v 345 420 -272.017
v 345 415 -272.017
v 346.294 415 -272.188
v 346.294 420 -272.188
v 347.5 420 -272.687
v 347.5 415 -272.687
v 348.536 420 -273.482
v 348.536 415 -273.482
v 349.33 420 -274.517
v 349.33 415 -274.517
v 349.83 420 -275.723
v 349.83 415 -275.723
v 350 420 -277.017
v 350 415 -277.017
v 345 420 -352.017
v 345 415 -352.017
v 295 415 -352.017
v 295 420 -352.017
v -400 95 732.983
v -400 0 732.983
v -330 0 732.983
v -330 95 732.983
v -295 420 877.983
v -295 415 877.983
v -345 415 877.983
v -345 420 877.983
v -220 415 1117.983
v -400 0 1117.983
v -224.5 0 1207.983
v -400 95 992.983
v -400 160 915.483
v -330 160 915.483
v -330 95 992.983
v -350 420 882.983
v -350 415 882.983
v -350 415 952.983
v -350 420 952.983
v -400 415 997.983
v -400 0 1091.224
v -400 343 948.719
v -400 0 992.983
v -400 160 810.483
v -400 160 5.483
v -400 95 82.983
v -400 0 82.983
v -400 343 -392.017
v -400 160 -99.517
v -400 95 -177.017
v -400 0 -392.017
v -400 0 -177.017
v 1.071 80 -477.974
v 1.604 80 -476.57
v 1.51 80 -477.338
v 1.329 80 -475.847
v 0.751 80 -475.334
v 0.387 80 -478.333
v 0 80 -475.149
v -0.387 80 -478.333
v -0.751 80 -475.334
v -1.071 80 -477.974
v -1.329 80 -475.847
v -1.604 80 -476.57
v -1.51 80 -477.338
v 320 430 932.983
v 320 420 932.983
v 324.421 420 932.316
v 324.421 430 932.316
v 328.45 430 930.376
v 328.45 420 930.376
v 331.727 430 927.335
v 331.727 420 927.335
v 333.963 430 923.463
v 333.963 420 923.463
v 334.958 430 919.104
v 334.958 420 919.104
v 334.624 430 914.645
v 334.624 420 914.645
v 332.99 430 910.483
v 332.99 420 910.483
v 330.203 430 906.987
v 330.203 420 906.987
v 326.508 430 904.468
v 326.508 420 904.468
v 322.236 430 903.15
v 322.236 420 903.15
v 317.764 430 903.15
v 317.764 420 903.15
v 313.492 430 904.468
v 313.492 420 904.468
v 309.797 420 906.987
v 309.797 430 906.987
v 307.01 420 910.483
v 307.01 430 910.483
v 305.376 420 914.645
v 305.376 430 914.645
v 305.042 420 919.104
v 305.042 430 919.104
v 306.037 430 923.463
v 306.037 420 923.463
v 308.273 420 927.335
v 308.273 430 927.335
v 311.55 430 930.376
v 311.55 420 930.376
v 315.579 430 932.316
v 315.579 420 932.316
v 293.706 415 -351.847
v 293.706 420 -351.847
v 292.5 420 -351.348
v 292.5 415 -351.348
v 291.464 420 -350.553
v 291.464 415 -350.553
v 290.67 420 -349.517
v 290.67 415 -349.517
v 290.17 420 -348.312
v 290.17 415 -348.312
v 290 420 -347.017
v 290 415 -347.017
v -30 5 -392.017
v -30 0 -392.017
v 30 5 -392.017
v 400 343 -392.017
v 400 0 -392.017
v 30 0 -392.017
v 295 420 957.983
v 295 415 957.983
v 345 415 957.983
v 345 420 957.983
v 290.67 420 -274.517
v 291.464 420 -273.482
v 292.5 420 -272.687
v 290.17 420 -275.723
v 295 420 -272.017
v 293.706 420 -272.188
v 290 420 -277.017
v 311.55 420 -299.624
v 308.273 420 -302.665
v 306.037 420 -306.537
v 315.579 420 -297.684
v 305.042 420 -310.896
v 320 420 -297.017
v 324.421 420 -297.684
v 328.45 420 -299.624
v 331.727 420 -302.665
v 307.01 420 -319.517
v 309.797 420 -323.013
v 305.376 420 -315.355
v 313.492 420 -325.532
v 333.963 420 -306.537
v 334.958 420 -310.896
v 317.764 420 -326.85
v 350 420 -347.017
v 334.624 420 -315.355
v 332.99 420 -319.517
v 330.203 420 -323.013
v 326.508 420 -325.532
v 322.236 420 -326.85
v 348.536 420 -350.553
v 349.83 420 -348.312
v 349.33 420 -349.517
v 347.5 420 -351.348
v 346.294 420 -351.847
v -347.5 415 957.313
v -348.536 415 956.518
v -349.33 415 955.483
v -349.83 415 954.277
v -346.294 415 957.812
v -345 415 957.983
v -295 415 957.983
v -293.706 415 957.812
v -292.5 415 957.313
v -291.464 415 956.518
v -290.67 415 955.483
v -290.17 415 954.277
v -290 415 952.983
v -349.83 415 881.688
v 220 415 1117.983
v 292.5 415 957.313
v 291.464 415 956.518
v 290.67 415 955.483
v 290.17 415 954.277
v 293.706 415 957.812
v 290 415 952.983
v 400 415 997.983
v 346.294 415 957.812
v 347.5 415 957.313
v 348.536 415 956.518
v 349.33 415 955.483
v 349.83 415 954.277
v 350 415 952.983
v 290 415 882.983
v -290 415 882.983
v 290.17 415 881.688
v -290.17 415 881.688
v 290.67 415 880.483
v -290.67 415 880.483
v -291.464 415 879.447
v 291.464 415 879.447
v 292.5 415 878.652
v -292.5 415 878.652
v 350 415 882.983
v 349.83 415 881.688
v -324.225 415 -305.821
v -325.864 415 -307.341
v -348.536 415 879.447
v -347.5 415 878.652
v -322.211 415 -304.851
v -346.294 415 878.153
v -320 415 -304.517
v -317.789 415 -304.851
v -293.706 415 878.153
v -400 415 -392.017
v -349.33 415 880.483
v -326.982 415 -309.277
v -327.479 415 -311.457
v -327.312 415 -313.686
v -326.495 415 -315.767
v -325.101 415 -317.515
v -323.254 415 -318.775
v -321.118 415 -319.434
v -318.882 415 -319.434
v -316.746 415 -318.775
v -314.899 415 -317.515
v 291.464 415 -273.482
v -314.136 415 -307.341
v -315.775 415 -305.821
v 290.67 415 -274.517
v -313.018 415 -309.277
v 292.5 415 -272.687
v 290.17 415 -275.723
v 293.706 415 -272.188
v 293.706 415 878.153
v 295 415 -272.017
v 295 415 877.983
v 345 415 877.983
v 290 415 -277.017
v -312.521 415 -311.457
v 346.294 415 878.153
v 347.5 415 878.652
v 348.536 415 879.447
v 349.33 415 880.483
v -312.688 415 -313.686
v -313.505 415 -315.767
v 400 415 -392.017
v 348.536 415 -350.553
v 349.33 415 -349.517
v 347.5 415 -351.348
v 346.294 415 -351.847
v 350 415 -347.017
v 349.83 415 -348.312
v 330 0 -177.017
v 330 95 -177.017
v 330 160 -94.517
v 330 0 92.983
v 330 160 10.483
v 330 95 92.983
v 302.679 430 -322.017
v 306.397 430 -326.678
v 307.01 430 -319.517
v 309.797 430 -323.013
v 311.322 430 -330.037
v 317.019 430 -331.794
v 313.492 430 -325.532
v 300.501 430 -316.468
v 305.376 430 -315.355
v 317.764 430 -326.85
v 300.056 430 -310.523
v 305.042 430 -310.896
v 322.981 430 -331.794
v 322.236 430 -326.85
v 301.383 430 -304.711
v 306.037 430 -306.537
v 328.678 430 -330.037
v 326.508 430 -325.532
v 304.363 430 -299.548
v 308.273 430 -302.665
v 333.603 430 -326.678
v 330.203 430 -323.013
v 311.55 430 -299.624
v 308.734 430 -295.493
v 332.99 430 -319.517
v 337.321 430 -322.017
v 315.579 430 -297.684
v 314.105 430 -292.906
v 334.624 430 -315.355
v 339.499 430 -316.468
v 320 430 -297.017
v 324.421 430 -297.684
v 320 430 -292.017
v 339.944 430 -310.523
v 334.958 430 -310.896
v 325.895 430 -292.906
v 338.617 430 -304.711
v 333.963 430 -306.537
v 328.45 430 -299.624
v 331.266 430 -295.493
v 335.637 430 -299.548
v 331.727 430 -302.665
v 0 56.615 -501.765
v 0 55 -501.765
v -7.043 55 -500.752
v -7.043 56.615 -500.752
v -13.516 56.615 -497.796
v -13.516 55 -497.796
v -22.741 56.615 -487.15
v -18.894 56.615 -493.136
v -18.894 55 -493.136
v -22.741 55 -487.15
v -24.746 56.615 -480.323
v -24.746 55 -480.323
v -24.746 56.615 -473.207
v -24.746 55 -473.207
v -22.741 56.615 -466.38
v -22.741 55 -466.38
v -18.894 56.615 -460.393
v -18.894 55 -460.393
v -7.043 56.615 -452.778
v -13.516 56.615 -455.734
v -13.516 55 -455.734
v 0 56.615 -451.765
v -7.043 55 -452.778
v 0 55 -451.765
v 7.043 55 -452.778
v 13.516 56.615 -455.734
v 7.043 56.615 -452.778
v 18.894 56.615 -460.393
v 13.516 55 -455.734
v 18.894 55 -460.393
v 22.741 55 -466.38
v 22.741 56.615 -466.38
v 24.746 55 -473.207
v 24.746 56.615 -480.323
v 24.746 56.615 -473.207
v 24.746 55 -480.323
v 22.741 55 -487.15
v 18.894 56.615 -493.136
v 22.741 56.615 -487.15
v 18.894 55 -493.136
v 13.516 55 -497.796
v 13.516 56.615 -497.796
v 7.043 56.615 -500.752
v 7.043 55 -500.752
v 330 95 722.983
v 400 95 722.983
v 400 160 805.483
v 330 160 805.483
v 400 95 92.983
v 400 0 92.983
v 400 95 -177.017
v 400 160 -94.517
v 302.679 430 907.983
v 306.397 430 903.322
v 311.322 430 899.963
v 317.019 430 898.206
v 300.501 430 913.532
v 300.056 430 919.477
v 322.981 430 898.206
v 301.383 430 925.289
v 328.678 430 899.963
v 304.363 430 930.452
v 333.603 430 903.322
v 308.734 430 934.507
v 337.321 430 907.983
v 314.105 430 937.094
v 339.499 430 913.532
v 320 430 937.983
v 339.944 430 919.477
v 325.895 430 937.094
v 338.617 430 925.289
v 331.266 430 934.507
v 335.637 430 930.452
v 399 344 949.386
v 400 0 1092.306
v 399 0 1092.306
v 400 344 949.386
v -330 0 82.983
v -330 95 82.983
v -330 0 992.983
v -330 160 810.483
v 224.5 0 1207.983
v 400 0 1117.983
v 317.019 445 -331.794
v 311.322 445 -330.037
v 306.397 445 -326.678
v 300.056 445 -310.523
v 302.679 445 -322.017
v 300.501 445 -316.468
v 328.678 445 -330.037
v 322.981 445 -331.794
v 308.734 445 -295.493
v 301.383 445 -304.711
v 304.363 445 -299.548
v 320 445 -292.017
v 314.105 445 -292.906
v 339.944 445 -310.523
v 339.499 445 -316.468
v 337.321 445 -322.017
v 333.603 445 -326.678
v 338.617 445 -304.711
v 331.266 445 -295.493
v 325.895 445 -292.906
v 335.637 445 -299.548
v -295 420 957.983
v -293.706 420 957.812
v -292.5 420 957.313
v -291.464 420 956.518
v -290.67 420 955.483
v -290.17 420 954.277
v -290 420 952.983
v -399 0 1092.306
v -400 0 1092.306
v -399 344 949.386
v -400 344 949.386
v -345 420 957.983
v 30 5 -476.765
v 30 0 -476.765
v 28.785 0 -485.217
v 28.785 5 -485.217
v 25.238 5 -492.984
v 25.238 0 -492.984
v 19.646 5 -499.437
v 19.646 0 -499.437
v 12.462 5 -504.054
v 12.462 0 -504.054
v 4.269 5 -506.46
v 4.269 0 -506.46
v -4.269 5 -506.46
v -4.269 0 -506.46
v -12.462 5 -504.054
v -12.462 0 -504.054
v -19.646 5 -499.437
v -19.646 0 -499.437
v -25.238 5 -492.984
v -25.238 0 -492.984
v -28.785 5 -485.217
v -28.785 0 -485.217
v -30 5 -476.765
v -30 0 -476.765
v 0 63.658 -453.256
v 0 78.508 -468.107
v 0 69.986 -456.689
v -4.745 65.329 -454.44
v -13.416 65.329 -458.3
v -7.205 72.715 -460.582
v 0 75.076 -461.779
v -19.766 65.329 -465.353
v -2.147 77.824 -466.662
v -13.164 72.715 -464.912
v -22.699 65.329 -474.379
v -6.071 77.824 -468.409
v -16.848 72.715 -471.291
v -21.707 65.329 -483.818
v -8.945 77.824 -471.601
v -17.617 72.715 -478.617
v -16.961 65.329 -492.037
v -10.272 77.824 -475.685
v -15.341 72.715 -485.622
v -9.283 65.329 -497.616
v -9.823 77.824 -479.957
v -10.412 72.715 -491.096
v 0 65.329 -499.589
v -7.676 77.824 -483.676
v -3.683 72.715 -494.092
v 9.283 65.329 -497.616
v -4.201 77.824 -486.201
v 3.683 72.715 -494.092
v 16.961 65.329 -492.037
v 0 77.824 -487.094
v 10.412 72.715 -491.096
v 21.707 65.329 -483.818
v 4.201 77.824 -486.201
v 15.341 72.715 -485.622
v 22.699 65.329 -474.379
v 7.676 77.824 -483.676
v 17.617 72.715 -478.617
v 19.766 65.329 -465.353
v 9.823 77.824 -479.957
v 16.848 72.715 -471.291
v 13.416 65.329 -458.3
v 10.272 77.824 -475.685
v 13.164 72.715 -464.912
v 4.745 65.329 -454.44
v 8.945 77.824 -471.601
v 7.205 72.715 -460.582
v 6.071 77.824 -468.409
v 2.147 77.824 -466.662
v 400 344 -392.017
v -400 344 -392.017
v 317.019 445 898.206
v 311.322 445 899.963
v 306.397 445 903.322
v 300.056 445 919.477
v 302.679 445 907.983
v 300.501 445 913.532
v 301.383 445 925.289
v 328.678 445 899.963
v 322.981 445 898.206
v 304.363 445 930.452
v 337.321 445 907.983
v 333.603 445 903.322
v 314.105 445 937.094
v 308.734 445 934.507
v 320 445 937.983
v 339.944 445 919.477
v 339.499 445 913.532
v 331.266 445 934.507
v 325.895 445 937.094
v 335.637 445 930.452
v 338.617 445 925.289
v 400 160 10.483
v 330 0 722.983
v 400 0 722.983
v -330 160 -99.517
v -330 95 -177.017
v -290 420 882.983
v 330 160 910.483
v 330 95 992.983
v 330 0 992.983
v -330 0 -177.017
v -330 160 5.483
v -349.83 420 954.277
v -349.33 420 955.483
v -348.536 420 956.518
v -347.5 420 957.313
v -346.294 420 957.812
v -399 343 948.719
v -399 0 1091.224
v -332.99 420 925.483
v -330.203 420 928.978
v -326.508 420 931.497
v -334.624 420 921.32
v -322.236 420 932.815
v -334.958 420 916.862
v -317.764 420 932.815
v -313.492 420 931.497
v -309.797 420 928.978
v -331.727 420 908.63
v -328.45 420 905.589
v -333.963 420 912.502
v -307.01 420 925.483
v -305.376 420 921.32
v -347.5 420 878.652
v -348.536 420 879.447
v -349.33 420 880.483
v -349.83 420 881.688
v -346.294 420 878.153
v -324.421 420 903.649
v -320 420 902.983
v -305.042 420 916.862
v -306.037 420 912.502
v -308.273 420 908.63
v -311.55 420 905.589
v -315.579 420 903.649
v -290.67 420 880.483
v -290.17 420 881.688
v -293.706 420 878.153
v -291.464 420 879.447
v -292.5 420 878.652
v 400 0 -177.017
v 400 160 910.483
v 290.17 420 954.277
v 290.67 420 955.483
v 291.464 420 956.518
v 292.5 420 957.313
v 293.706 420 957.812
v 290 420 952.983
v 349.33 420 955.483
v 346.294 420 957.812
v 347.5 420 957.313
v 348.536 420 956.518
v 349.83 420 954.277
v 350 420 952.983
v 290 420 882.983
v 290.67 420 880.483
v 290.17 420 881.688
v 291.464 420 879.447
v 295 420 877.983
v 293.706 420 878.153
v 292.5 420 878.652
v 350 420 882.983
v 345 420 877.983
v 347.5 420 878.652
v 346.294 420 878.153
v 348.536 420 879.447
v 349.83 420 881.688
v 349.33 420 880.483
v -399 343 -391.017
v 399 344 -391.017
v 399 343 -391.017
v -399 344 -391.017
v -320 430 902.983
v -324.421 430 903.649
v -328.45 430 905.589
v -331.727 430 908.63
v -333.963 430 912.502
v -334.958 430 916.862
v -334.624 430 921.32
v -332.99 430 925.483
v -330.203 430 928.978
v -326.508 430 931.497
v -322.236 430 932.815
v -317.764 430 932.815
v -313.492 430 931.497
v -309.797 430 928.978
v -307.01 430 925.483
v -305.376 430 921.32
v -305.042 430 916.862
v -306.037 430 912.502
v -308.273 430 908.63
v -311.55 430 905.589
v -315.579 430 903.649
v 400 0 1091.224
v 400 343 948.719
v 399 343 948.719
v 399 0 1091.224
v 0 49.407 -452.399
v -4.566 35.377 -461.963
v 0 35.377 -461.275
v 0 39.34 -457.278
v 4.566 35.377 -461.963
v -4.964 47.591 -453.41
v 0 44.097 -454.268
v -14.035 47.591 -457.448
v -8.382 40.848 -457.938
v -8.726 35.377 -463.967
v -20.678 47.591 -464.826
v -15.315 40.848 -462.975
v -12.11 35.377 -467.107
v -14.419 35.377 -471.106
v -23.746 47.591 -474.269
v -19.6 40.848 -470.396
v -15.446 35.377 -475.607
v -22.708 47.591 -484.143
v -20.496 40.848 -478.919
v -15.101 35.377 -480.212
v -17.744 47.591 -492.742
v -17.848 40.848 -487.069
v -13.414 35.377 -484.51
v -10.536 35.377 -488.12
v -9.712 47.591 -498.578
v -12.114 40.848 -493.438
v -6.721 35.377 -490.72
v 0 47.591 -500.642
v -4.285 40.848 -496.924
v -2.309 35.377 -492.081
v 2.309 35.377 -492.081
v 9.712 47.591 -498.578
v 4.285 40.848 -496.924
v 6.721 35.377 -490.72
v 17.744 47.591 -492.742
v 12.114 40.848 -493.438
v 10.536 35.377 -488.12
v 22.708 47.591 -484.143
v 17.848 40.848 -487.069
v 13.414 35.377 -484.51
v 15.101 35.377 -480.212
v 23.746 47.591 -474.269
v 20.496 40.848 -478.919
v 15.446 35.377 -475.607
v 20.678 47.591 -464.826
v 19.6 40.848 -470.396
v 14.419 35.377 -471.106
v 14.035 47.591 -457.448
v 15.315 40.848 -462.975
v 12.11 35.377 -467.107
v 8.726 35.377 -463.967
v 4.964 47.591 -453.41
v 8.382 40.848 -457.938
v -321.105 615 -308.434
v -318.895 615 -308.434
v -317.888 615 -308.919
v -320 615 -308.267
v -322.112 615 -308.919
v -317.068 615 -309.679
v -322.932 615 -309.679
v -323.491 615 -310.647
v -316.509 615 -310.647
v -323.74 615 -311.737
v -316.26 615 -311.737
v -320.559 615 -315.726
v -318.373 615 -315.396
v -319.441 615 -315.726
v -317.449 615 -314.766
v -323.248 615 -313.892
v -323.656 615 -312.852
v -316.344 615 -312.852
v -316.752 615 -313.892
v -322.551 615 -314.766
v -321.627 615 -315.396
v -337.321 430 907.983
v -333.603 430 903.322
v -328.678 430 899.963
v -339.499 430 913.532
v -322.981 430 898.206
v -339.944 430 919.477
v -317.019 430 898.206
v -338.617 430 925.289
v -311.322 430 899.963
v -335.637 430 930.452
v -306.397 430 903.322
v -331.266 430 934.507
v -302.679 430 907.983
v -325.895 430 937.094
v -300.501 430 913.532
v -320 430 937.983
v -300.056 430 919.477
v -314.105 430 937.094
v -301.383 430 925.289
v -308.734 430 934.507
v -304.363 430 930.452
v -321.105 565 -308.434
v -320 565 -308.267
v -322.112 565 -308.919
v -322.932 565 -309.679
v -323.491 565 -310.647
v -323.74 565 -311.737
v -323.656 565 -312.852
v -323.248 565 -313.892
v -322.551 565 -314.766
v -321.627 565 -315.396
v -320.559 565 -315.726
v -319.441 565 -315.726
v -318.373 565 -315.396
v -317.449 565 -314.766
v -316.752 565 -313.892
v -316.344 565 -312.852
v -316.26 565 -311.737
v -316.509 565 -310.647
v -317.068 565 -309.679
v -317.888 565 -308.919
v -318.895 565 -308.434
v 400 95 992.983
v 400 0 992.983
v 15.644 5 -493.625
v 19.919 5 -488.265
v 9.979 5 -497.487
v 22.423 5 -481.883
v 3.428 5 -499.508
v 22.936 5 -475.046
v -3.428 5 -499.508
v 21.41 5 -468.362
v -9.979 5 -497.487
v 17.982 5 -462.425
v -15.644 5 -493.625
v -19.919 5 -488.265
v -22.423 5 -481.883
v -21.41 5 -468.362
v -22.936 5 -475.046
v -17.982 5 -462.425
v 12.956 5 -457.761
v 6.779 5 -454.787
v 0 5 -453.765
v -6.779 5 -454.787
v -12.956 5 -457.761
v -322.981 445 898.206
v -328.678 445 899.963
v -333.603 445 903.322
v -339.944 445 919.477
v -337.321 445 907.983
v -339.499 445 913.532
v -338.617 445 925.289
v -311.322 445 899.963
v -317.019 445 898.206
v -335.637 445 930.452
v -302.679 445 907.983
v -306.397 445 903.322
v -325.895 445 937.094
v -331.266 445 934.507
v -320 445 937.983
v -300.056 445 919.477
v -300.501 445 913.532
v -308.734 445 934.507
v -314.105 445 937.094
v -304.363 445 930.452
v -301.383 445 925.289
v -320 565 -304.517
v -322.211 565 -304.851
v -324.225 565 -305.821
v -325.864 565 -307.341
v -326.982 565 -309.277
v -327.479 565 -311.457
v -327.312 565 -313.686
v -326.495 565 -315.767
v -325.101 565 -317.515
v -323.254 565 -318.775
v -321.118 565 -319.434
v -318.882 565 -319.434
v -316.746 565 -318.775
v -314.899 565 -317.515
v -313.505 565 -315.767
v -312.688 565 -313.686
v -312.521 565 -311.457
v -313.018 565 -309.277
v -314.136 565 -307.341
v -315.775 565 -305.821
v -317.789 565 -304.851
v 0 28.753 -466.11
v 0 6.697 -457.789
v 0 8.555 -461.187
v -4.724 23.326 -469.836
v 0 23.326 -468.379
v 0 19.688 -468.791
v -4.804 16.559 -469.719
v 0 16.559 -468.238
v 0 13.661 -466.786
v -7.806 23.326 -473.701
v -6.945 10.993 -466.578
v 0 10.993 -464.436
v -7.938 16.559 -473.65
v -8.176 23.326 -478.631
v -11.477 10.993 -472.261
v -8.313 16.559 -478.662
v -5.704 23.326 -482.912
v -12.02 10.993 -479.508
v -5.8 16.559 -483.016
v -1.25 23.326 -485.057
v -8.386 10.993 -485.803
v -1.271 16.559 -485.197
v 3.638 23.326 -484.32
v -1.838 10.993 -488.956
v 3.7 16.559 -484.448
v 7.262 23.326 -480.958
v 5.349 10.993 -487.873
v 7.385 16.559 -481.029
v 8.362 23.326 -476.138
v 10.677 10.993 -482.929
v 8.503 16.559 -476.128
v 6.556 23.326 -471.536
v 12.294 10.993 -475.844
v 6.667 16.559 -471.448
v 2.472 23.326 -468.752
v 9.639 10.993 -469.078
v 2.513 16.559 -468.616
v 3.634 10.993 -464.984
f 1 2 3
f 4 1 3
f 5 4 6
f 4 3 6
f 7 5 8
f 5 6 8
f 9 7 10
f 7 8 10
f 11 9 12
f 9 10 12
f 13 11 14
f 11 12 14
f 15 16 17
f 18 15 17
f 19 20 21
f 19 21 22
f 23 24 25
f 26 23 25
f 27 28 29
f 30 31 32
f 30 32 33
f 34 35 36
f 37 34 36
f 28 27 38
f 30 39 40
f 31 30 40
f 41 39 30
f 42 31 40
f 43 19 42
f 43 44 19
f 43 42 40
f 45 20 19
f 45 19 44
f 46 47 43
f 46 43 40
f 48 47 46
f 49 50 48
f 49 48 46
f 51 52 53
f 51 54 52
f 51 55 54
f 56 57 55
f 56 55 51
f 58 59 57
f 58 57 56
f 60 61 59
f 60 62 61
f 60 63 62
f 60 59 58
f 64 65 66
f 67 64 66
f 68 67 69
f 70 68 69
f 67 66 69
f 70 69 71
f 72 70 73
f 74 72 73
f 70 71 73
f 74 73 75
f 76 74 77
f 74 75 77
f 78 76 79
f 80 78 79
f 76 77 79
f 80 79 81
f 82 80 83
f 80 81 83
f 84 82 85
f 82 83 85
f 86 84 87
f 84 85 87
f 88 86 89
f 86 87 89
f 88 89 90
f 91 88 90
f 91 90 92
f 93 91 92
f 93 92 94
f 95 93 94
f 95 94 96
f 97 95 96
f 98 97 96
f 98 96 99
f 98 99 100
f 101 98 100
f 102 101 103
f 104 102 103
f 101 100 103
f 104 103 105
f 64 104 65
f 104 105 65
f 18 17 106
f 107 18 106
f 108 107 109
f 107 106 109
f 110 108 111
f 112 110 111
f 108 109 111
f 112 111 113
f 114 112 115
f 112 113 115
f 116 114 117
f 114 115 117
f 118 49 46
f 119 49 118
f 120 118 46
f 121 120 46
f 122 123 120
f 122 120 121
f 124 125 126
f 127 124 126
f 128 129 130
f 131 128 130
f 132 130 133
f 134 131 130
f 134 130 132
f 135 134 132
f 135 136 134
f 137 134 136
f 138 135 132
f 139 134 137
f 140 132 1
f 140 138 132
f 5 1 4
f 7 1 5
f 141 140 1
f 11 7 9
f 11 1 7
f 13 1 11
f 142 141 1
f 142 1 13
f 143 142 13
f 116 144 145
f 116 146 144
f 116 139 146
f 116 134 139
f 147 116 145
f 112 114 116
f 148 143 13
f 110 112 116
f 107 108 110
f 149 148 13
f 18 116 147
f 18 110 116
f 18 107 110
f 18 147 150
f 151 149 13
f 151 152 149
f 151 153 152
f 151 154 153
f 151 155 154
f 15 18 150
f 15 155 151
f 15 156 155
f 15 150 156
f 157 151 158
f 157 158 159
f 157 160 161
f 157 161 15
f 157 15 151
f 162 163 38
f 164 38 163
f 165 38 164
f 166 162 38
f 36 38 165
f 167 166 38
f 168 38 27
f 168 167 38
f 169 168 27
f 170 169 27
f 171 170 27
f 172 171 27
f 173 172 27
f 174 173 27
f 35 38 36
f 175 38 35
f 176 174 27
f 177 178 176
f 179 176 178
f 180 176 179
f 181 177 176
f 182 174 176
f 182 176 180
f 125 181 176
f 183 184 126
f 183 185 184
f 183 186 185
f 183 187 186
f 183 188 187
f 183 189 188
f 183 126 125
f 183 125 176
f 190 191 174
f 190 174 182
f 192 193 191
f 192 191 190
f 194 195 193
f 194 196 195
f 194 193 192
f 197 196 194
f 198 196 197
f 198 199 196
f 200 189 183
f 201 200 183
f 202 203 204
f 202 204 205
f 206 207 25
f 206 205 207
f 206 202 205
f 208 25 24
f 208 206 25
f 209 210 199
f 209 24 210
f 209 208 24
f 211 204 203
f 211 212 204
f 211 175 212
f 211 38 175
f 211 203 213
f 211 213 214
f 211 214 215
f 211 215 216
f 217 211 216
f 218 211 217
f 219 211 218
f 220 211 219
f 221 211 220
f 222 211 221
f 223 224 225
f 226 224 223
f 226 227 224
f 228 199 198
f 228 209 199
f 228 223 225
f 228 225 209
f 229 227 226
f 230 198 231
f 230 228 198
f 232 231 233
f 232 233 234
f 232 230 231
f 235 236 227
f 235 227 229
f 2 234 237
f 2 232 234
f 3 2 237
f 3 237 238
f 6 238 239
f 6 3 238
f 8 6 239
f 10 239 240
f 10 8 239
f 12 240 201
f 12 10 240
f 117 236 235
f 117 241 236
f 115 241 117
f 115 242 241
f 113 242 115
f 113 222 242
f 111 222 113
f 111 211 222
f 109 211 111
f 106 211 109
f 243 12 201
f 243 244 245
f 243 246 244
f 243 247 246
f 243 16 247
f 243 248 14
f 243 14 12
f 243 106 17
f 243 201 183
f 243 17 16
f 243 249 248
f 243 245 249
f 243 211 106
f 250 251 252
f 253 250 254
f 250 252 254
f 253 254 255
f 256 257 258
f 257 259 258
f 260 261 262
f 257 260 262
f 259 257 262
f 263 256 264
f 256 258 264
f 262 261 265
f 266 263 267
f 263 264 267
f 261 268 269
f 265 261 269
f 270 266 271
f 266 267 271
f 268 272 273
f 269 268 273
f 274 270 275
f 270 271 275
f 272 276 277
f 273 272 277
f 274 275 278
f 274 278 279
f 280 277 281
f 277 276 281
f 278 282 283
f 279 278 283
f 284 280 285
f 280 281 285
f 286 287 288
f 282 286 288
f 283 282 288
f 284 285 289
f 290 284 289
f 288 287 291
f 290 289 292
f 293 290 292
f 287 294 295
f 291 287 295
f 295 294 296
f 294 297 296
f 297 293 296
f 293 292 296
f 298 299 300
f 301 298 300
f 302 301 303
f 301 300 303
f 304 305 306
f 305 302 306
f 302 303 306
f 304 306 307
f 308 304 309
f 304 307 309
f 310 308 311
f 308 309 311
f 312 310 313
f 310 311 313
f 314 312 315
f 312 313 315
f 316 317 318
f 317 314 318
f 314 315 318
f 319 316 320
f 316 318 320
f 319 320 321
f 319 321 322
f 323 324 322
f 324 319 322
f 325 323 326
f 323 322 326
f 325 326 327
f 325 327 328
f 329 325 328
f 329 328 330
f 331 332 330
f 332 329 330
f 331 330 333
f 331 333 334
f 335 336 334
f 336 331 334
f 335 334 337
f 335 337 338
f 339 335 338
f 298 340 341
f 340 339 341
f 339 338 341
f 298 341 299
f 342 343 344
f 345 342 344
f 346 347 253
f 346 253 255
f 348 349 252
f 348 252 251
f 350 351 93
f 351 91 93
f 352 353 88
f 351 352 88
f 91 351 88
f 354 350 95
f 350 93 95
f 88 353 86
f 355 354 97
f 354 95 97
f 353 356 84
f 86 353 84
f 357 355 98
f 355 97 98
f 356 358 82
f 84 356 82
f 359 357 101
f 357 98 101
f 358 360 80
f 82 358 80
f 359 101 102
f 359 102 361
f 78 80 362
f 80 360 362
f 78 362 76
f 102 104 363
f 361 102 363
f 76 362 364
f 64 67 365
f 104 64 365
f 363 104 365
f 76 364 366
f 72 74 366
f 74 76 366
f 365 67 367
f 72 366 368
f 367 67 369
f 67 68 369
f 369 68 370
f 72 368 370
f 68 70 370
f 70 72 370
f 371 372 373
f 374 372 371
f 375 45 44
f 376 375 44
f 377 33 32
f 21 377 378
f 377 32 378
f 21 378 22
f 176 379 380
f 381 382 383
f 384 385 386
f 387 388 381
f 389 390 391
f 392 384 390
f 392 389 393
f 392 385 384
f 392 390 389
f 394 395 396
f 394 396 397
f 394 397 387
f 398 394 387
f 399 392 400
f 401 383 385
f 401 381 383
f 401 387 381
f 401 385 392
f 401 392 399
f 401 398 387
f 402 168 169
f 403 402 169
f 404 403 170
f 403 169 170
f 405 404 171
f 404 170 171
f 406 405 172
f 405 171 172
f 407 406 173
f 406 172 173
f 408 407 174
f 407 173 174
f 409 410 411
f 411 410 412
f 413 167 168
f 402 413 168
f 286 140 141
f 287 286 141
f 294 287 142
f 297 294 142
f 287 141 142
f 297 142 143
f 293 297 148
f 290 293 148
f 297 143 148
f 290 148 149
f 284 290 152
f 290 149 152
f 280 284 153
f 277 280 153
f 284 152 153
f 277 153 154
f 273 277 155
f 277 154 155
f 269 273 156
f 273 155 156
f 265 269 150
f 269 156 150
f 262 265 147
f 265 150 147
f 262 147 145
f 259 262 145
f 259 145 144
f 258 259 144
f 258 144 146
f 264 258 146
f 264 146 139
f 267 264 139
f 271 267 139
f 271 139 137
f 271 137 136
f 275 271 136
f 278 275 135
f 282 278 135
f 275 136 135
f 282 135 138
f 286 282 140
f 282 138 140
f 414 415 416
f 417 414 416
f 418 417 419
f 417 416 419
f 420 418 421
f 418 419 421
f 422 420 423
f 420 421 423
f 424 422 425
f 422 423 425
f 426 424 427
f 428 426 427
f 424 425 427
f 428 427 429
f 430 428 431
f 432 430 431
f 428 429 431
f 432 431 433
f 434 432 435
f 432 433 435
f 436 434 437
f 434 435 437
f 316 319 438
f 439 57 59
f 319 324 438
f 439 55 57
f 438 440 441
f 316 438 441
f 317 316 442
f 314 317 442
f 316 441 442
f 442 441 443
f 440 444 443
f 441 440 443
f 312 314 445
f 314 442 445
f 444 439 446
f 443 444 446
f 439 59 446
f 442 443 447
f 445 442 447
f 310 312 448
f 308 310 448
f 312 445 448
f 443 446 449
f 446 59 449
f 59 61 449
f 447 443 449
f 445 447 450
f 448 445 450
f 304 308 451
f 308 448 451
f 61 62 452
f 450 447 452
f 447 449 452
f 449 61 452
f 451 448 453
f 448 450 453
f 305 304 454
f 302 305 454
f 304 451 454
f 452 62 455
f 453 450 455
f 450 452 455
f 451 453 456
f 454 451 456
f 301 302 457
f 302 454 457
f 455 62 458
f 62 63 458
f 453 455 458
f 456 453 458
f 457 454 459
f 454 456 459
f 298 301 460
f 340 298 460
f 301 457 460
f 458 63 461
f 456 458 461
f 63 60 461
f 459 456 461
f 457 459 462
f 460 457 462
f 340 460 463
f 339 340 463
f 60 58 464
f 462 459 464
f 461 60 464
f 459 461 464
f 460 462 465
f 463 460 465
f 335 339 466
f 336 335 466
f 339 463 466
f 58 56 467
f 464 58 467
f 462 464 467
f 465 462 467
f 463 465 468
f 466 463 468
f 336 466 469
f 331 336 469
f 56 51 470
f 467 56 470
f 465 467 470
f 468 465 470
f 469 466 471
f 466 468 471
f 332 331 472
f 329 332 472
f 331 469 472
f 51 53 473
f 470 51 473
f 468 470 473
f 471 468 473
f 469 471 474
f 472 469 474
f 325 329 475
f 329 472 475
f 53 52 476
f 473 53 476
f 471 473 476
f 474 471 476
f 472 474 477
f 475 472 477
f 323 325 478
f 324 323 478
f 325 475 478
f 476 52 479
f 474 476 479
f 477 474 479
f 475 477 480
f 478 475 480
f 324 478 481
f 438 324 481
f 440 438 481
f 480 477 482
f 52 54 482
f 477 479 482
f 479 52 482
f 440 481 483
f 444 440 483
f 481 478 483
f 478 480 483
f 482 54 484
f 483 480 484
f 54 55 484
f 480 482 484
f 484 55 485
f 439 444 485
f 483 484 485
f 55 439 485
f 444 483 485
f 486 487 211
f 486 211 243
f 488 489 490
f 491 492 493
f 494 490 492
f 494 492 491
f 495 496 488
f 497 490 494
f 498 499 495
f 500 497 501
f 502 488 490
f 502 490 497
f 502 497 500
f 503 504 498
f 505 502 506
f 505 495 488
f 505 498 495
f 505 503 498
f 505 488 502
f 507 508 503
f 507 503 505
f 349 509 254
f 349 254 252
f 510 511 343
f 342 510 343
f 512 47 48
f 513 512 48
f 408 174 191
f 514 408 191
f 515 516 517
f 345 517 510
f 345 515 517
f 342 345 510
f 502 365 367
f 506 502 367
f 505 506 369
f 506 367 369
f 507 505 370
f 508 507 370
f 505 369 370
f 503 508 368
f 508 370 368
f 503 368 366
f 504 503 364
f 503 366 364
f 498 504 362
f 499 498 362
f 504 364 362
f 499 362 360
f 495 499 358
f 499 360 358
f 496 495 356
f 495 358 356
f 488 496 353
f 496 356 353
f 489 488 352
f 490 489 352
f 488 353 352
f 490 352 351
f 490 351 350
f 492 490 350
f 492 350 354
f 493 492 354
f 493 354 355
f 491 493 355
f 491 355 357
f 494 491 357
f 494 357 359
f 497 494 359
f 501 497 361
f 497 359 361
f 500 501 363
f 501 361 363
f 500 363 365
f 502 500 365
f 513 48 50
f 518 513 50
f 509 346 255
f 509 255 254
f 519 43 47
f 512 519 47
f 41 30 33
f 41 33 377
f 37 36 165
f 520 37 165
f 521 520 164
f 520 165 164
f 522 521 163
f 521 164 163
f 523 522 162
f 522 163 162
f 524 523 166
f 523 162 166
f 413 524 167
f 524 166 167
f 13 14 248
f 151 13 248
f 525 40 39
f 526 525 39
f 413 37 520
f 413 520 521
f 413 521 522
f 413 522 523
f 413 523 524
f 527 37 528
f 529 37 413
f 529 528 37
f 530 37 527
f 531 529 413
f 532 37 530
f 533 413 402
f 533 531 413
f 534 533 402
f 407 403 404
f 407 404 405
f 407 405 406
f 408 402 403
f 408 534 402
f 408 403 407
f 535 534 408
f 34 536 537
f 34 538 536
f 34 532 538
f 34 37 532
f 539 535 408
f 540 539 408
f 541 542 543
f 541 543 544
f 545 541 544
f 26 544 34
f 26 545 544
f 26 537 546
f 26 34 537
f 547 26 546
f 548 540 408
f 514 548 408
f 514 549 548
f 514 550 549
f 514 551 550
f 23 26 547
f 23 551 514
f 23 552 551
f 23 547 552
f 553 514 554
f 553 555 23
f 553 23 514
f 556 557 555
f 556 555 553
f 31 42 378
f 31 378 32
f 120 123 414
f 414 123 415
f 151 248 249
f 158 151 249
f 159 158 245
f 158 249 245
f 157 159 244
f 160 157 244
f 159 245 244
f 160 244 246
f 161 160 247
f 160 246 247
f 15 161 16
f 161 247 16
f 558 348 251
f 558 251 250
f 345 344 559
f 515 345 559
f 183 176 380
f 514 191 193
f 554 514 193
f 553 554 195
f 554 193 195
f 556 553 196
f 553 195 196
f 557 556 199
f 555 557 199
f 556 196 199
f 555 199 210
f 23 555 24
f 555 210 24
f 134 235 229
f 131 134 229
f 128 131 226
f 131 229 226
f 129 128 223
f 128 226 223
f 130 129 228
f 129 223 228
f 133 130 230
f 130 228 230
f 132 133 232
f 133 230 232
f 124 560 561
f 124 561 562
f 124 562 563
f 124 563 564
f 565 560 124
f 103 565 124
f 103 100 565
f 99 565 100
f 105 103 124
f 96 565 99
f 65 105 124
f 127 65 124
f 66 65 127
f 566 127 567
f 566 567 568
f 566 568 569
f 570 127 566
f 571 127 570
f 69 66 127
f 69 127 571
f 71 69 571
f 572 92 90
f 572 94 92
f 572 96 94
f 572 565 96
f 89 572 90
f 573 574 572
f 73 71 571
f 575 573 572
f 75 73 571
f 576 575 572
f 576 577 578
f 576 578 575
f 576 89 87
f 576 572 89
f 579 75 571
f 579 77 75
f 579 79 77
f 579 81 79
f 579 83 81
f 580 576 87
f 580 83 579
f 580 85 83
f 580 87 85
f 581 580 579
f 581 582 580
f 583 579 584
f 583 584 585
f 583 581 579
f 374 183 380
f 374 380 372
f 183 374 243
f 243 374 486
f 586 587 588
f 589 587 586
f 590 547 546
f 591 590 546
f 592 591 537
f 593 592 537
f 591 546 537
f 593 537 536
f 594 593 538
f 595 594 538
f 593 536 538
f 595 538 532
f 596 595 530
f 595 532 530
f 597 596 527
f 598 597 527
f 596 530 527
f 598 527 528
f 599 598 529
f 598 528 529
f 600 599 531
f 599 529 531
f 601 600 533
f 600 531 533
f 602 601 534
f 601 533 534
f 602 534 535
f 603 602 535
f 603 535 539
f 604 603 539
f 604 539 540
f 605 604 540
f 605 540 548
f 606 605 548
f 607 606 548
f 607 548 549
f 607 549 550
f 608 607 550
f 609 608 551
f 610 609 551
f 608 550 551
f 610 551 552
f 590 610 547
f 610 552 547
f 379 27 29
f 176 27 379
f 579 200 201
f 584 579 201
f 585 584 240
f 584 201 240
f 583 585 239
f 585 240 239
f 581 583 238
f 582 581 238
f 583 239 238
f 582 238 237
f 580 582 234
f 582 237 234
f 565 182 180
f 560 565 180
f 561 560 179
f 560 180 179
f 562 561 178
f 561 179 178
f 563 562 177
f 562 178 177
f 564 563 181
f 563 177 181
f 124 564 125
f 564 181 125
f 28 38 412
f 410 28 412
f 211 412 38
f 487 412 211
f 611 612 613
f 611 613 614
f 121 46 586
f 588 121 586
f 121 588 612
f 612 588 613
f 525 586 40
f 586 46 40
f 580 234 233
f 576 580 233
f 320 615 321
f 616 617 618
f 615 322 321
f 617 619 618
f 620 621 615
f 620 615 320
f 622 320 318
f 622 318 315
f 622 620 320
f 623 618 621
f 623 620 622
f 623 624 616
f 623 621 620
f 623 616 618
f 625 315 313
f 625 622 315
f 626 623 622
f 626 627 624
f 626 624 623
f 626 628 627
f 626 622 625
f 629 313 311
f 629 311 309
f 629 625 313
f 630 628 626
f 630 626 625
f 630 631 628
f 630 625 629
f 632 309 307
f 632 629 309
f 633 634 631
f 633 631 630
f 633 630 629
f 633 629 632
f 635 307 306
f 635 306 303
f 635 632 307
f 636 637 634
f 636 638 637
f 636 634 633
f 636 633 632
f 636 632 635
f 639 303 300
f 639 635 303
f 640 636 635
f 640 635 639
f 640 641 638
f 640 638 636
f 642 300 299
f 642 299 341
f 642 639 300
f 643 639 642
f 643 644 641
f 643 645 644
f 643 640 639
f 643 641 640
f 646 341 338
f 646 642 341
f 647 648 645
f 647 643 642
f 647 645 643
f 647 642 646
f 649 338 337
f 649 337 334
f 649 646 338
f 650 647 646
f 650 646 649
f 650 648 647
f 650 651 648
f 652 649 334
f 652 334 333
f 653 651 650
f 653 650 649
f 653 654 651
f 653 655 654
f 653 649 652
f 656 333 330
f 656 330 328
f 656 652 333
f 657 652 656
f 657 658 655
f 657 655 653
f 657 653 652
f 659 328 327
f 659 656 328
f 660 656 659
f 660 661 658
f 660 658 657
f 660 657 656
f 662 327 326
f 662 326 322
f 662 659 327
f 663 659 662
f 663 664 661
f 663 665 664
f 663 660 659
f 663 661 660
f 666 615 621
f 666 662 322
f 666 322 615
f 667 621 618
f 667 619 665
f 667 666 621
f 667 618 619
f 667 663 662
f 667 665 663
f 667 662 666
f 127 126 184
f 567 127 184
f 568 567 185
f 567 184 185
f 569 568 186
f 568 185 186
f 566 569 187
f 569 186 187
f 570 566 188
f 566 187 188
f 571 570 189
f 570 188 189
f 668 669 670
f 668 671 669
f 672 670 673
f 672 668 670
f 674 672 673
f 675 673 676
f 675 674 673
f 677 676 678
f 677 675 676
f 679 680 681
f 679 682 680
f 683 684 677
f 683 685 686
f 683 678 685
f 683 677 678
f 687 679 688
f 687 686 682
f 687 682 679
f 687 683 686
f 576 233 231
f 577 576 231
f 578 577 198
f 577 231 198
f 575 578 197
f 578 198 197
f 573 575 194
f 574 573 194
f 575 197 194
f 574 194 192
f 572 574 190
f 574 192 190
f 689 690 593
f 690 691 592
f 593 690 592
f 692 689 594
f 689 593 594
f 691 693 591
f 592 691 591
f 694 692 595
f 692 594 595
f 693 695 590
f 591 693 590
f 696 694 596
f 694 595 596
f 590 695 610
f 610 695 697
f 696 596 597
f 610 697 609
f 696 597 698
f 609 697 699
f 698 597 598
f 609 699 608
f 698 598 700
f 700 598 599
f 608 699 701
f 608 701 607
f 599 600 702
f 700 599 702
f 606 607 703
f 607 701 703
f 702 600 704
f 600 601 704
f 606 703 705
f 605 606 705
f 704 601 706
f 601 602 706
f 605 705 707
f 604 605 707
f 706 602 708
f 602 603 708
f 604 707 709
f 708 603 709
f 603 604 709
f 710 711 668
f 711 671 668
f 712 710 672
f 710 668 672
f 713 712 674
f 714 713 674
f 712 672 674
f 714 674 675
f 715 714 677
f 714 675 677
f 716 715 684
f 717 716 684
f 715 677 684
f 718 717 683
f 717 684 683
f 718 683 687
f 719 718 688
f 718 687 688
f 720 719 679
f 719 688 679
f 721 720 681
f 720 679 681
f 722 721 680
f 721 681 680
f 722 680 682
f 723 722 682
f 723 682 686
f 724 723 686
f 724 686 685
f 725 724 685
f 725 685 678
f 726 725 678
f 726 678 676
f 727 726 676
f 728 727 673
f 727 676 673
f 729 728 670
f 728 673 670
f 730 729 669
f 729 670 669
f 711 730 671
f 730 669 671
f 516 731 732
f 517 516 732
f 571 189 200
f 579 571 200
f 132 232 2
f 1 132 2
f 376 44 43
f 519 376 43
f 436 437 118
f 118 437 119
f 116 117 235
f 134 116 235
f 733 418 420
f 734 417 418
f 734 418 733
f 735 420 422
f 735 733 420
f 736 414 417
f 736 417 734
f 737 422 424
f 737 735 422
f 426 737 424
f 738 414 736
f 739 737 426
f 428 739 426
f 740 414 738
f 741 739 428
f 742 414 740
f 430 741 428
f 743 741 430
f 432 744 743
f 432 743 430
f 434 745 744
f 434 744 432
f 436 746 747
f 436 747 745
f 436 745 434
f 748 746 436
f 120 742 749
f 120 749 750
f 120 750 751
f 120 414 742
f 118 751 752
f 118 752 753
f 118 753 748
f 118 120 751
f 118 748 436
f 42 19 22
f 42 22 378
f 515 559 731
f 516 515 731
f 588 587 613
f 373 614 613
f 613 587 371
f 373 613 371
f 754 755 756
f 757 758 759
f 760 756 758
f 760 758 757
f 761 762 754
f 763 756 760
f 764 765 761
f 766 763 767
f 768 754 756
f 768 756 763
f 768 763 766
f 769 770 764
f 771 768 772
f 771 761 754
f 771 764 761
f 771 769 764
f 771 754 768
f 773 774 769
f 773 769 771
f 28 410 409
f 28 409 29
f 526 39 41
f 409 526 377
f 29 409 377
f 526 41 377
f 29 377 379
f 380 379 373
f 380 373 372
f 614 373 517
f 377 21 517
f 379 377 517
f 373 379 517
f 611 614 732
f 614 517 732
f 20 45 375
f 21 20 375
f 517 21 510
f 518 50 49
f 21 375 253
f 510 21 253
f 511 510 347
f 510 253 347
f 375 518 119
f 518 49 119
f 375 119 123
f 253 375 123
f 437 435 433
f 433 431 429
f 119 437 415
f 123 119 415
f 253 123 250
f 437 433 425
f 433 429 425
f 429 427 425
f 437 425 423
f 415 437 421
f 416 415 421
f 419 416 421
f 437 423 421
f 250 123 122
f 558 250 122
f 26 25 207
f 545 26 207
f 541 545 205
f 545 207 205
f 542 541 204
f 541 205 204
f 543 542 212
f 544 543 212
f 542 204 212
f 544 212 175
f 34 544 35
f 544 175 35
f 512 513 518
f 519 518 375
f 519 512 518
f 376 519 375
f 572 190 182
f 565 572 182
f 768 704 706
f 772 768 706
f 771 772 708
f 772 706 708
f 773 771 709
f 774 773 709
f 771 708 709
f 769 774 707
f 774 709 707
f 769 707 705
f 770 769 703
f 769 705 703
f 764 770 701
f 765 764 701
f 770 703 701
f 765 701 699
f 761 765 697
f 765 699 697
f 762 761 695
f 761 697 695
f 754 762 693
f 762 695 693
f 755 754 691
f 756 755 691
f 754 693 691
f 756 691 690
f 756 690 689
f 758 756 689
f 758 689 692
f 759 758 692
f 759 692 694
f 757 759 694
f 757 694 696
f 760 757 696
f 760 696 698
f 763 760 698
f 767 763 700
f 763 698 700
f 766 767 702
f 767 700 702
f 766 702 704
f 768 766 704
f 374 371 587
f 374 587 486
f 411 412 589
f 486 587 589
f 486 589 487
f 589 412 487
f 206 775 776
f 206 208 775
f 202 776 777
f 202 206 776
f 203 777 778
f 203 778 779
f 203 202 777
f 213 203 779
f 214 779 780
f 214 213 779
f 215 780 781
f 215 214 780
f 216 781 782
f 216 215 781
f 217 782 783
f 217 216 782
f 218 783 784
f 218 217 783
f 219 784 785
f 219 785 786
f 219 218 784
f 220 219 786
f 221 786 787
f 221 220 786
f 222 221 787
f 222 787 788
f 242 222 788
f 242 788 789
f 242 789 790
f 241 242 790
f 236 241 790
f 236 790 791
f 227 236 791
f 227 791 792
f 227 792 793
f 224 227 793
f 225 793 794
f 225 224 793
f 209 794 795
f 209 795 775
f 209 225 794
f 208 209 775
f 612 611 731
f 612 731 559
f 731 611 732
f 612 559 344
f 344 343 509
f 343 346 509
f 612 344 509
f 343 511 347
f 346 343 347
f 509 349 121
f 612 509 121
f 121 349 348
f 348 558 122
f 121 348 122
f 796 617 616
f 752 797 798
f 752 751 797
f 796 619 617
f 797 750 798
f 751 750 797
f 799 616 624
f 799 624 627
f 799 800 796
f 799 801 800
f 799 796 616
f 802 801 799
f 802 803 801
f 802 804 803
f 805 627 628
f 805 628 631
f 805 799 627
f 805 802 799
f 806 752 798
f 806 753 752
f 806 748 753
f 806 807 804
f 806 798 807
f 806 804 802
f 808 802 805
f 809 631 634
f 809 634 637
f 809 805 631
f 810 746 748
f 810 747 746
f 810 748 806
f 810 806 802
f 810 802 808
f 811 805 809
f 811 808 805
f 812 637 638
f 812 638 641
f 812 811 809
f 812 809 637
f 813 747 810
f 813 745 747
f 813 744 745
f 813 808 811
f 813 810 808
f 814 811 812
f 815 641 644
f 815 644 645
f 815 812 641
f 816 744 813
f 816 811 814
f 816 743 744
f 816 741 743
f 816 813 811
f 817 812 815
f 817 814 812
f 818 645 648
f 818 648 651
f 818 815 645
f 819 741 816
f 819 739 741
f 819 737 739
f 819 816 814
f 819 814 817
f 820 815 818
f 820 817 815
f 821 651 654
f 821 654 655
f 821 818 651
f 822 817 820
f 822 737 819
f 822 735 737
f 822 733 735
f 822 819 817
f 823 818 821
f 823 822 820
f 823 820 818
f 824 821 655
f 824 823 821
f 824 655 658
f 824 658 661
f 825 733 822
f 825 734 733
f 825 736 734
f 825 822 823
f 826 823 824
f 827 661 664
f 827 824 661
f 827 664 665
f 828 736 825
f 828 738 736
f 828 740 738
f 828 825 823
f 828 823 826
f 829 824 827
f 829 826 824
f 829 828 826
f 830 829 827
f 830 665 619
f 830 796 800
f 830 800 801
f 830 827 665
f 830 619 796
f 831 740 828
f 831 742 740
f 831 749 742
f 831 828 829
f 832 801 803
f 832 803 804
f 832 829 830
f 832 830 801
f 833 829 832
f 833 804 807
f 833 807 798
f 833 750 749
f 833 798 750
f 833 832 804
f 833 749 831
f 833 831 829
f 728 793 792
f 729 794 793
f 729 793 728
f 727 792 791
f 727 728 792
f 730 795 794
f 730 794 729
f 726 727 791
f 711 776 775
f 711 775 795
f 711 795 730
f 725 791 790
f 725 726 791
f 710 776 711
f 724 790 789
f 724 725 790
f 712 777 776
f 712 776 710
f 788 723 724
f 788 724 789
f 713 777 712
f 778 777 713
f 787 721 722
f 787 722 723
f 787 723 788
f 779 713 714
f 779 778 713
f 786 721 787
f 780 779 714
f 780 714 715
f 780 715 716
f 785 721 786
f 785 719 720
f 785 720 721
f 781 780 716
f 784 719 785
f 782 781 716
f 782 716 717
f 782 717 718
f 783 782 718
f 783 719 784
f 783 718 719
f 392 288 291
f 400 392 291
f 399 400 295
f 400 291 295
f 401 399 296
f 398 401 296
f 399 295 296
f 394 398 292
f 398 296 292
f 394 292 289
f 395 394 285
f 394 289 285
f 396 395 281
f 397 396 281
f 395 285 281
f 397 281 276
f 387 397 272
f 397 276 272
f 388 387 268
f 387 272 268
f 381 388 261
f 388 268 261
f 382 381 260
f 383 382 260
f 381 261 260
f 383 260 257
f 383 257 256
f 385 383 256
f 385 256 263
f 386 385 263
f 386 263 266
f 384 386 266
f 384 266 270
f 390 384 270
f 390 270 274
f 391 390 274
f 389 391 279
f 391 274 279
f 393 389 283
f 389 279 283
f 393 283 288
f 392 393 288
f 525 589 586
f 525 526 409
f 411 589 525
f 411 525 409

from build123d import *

# Parameters (mm, degrees)
CROQUIS1_W              = 800
CROQUIS1_H              = 1600
SALIENTE_EXTRUIR1_DEPTH = 415
CORTAR_EXTRUIR1_DEPTH   = 200
CORTAR_EXTRUIR2_DEPTH   = 200
CORTAR_EXTRUIR6_DEPTH   = 499
CORTAR_EXTRUIR8_DEPTH   = 359
CORTAR_EXTRUIR10_DEPTH  = 353
CORTAR_EXTRUIR12_DEPTH  = 514
CORTAR_EXTRUIR13_DEPTH  = 514
CORTAR_EXTRUIR16_DEPTH  = 70
CORTAR_EXTRUIR17_DEPTH  = 70
CORTAR_EXTRUIR18_DEPTH  = 1
CROQUIS20_W             = 800
CROQUIS20_H             = 1
CORTAR_EXTRUIR19_DEPTH  = 1
SALIENTE_EXTRUIR2_DEPTH = 5
CROQUIS22_R             = 15
SALIENTE_EXTRUIR3_DEPTH = 10
CROQUIS23_R             = 20
SALIENTE_EXTRUIR4_DEPTH = 15
SALIENTE_EXTRUIR5_DEPTH = 5
CROQUIS26_R             = 25
SALIENTE_EXTRUIR6_DEPTH = 75


with BuildPart() as part:
    # Croquis1 → Saliente-Extruir1 (new body)
    with BuildSketch(Plane(origin=(0, 0, 0), x_dir=(1, 0, 0), z_dir=(0, 1, 0))):
        with Locations((0, -407.98258177)):
            Rectangle(CROQUIS1_W, CROQUIS1_H)
    extrude(amount=SALIENTE_EXTRUIR1_DEPTH)

    # Croquis3 → Cortar-Extruir1 (cut)
    with BuildSketch(Plane(origin=(604.100569287, 262.019524028, 906.150853931), x_dir=(-0.8421068082275548, 0.1498081502111445, 0.5180865194802076), z_dir=(-0.5393107856670403, -0.23391793113269235, -0.8089661785005605))):
        Polygon((456.118589156, 88.118028239), (242.368981337, -310.549885139), (242.368981337, 121.451272267), align=None)
    extrude(amount=-CORTAR_EXTRUIR1_DEPTH, mode=Mode.SUBTRACT)

    # Croquis5 → Cortar-Extruir2 (cut)
    with BuildSketch(Plane(origin=(-604.100569287, 262.019524028, 906.150853931), x_dir=(-0.8421068082275548, -0.1498081502111445, -0.5180865194802076), z_dir=(0.5393107856670404, -0.2339179311326923, -0.8089661785005605))):
        Polygon((-242.368981337, -310.549885139), (-242.368981337, 121.451272267), (-456.118589156, 88.118028239), align=None)
    extrude(amount=-CORTAR_EXTRUIR2_DEPTH, mode=Mode.SUBTRACT)

    # Croquis8 → Cortar-Extruir6 (cut)
    with BuildSketch(Plane(origin=(0, 250.204627362, 1153.721337281), x_dir=(-1, 0, 0), z_dir=(0, -0.21194078521367435, -0.9772825095963864))):
        Polygon((220, 168.626135247), (400, -256.020776905), (-400, -256.020776905), (-220, 168.626135247), (0, 168.626135247), align=None)
    extrude(amount=-CORTAR_EXTRUIR6_DEPTH, mode=Mode.SUBTRACT)

    # Croquis12 → Cortar-Extruir8 (cut)
    with BuildSketch(Plane.XY.offset(1117.98258177)):
        Polygon((220, 415), (400, 0), (400, 415), align=None)
    extrude(amount=CORTAR_EXTRUIR8_DEPTH, mode=Mode.SUBTRACT)

    # Croquis14 → Cortar-Extruir10 (cut)
    with BuildSketch(Plane.XY.offset(1117.98258177)):
        Polygon((-220, 415), (-400, 0), (-400, 415), align=None)
    extrude(amount=CORTAR_EXTRUIR10_DEPTH, mode=Mode.SUBTRACT)

    # Croquis15 → Cortar-Extruir12 (cut)
    with BuildSketch(Plane(origin=(516.98244579, 224.233349981, 1008.11576929), x_dir=(-0.8942171635698928, 0.0971910742249457, 0.4369548712029846), z_dir=(-0.44763340400043405, -0.19415424751826063, -0.8728851378008463))):
        Polygon((327.082120211, -262.279632659), (130.821069596, -242.738649788), (332.114454842, 162.361304614), align=None)
    extrude(amount=-CORTAR_EXTRUIR12_DEPTH, mode=Mode.SUBTRACT)


with BuildPart() as body_2:
    # of the pieces the cut leaves, the one that is kept (cortar_extruir12_keep)
    add(part.part.solids().sort_by_distance((-400, 0, 1207.98258177))[0])

    # Croquis16 → Cortar-Extruir13 (cut)
    with BuildSketch(Plane(origin=(-516.98244579, 224.233349981, 1008.11576929), x_dir=(-0.8942171635698928, -0.09719107422494568, -0.43695487120298454), z_dir=(0.44763340400043394, -0.19415424751826066, -0.8728851378008463))):
        Polygon((-327.082120211, -262.279632659), (-332.114454842, 162.361304614), (-130.821069596, -242.738649788), align=None)
    extrude(amount=-CORTAR_EXTRUIR13_DEPTH, mode=Mode.SUBTRACT)


with BuildPart() as body_2_2:
    # of the pieces the cut leaves, the one that is kept (cortar_extruir13_keep)
    add(body_2.part.solids().sort_by_distance((224.5, 0, 1207.98258177))[0])

    # Croquis17 → Cortar-Extruir16 (cut)
    with BuildSketch(Plane(origin=(400, 0, 0), x_dir=(0, 0, -1), z_dir=(1, 0, 0))):
        Polygon((177.01741823, 0), (-92.98258177, 0), (-92.98258177, 95), (-10.48258177, 160), (94.51741823, 160), (177.01741823, 95), align=None)
        Polygon((-992.98258177, 0), (-722.98258177, 0), (-722.98258177, 95), (-805.48258177, 160), (-910.48258177, 160), (-992.98258177, 95), align=None)
    extrude(amount=-CORTAR_EXTRUIR16_DEPTH, mode=Mode.SUBTRACT)

    # Croquis18 → Cortar-Extruir17 (cut)
    with BuildSketch(Plane.ZY.offset(400)):
        Polygon((-177.01741823, 0), (82.98258177, 0), (82.98258177, 95), (5.48258177, 160), (-99.51741823, 160), (-177.01741823, 95), align=None)
        Polygon((992.98258177, 0), (732.98258177, 0), (732.98258177, 95), (810.48258177, 160), (915.48258177, 160), (992.98258177, 95), align=None)
    extrude(amount=-CORTAR_EXTRUIR17_DEPTH, mode=Mode.SUBTRACT)

    # Croquis19 → Cortar-Extruir18 (cut)
    with BuildSketch(Plane(origin=(400, 0, 0), x_dir=(0, 0, -1), z_dir=(1, 0, 0))):
        Polygon((392.01741823, 343), (-948.718987098, 343), (-1091.223533976, 0), (-1092.306405756, 0), (-949.386393727, 344), (392.01741823, 344), align=None)
    cortar_extruir18 = extrude(amount=-CORTAR_EXTRUIR18_DEPTH, mode=Mode.SUBTRACT)

    # Croquis20 → Cortar-Extruir19 (cut)
    with BuildSketch(Plane(origin=(0, 0, -392.01741823), x_dir=(-1, 0, 0), z_dir=(0, 0, -1))):
        with Locations((0, 343.5)):
            Rectangle(CROQUIS20_W, CROQUIS20_H)
    extrude(amount=-CORTAR_EXTRUIR19_DEPTH, mode=Mode.SUBTRACT)

    # Simetría1: Cortar-Extruir18 across plane
    add(cortar_extruir18.mirror(Plane.ZY), mode=Mode.SUBTRACT)

    # Croquis21 → Saliente-Extruir2 (add)
    with BuildSketch(Plane(origin=(0, 415, 0), x_dir=(1, 0, 0), z_dir=(0, 1, 0))):
        with BuildLine():
            Line((295, 272.01741823), (345, 272.01741823))
            ThreePointArc((345, 272.01741823), (348.535533906, 273.481884325), (350, 277.01741823))
            Line((350, 277.01741823), (350, 347.01741823))
            ThreePointArc((350, 347.01741823), (348.535533906, 350.552952136), (345, 352.01741823))
            Line((345, 352.01741823), (295, 352.01741823))
            ThreePointArc((295, 352.01741823), (291.464466094, 350.552952136), (290, 347.01741823))
            Line((290, 347.01741823), (290, 277.01741823))
            ThreePointArc((290, 277.01741823), (291.464466094, 273.481884325), (295, 272.01741823))
        make_face()
        with BuildLine():
            Line((290, -882.98258177), (290, -952.98258177))
            ThreePointArc((290, -952.98258177), (291.464466094, -956.518115675), (295, -957.98258177))
            Line((295, -957.98258177), (345, -957.98258177))
            ThreePointArc((345, -957.98258177), (348.535533906, -956.518115675), (350, -952.98258177))
            Line((350, -952.98258177), (350, -882.98258177))
            ThreePointArc((350, -882.98258177), (348.535533906, -879.447047864), (345, -877.98258177))
            Line((345, -877.98258177), (295, -877.98258177))
            ThreePointArc((295, -877.98258177), (291.464466094, -879.447047864), (290, -882.98258177))
        make_face()
        with BuildLine():
            Line((-295, -877.98258177), (-345, -877.98258177))
            ThreePointArc((-345, -877.98258177), (-348.535533906, -879.447047864), (-350, -882.98258177))
            Line((-350, -882.98258177), (-350, -952.98258177))
            ThreePointArc((-350, -952.98258177), (-348.535533906, -956.518115675), (-345, -957.98258177))
            Line((-345, -957.98258177), (-295, -957.98258177))
            ThreePointArc((-295, -957.98258177), (-291.464466094, -956.518115675), (-290, -952.98258177))
            Line((-290, -952.98258177), (-290, -882.98258177))
            ThreePointArc((-290, -882.98258177), (-291.464466094, -879.447047864), (-295, -877.98258177))
        make_face()
    extrude(amount=SALIENTE_EXTRUIR2_DEPTH)

    # Croquis22 → Saliente-Extruir3 (add)
    with BuildSketch(Plane(origin=(0, 420, 0), x_dir=(1, 0, 0), z_dir=(0, 1, 0))):
        with Locations((320, 312.01741823)):
            Circle(CROQUIS22_R)
        with Locations((320, -917.98258177)):
            Circle(CROQUIS22_R)
        with Locations((-320, -917.98258177)):
            Circle(CROQUIS22_R)
    extrude(amount=SALIENTE_EXTRUIR3_DEPTH)

    # Croquis23 → Saliente-Extruir4 (add)
    with BuildSketch(Plane(origin=(0, 430, 0), x_dir=(1, 0, 0), z_dir=(0, 1, 0))):
        with Locations((320, 312.01741823)):
            Circle(CROQUIS23_R)
        with Locations((320, -917.98258177)):
            Circle(CROQUIS23_R)
        with Locations((-320, -917.98258177)):
            Circle(CROQUIS23_R)
    extrude(amount=SALIENTE_EXTRUIR4_DEPTH)

    # Croquis25 → Saliente-Extruir5 (add)
    with BuildSketch(Plane.XZ):
        with BuildLine():
            Line((-30, -476.764876907), (-30, -392.01741823))
            Line((-30, -392.01741823), (30, -392.01741823))
            Line((30, -392.01741823), (30, -476.764876907))
            ThreePointArc((30, -476.764876907), (0, -506.764876907), (-30, -476.764876907))
        make_face()
    extrude(amount=-SALIENTE_EXTRUIR5_DEPTH)

    # Croquis26 → Saliente-Extruir6 (add)
    with BuildSketch(Plane(origin=(0, 5, 0), x_dir=(1, 0, 0), z_dir=(0, 1, 0))):
        with Locations((0, 476.764876907)):
            Circle(CROQUIS26_R)
    extrude(amount=SALIENTE_EXTRUIR6_DEPTH)

    # Croquis28 → Cortar-Revolución7 (revolve, cut)
    with BuildSketch(Plane.ZY):
        with BuildLine():
            Line((-451.764876907, 5), (-451.764876907, 55))
            ThreePointArc((-451.764876907, 55), (-454.267783945, 44.096752398), (-461.275341569, 35.376690009))
            add(Edge.make_bspline(
                [(-461.275341569, 35.376690009), (-479.429840017, 14.56995995), (-453.764876907, 5)],
                knots=[0, 0, 0, 1, 1, 1], degree=2))
            Line((-453.764876907, 5), (-451.764876907, 5))
        make_face()
    revolve(axis=Axis((0, 90.386786237, -476.764876907), (0, -1, 0)), mode=Mode.SUBTRACT)

    # Croquis29 → Cortar-Revolución26 (revolve, cut)
    with BuildSketch(Plane.ZY):
        with BuildLine():
            Line((-475.149447102, 80), (-475.149447102, 84.514502028))
            Line((-475.149447102, 84.514502028), (-446.334832781, 84.514502028))
            Line((-446.334832781, 84.514502028), (-446.334832781, 57.478552518))
            Line((-446.334832781, 57.478552518), (-451.764876907, 56.615429804))
            ThreePointArc((-451.764876907, 56.615429804), (-459.050340313, 72.714536594), (-475.149447102, 80))
        make_face()
    revolve(axis=Axis((0, 80, -476.764876907), (0, -1, 0)), mode=Mode.SUBTRACT)

    # Croquis30 → Revolución1 (revolve)
    with BuildSketch(Plane(origin=(0, 0, -312.01741823), x_dir=(-1, 0, 0), z_dir=(0, 0, -1))):
        Polygon((327.5, 415), (327.5, 565), (323.75, 565), (323.75, 615), (320, 615), (320, 415), align=None)
    revolve(axis=Axis((-320, 633.577098179, -312.01741823), (0, -1, 0)))


solid = body_2_2.part
